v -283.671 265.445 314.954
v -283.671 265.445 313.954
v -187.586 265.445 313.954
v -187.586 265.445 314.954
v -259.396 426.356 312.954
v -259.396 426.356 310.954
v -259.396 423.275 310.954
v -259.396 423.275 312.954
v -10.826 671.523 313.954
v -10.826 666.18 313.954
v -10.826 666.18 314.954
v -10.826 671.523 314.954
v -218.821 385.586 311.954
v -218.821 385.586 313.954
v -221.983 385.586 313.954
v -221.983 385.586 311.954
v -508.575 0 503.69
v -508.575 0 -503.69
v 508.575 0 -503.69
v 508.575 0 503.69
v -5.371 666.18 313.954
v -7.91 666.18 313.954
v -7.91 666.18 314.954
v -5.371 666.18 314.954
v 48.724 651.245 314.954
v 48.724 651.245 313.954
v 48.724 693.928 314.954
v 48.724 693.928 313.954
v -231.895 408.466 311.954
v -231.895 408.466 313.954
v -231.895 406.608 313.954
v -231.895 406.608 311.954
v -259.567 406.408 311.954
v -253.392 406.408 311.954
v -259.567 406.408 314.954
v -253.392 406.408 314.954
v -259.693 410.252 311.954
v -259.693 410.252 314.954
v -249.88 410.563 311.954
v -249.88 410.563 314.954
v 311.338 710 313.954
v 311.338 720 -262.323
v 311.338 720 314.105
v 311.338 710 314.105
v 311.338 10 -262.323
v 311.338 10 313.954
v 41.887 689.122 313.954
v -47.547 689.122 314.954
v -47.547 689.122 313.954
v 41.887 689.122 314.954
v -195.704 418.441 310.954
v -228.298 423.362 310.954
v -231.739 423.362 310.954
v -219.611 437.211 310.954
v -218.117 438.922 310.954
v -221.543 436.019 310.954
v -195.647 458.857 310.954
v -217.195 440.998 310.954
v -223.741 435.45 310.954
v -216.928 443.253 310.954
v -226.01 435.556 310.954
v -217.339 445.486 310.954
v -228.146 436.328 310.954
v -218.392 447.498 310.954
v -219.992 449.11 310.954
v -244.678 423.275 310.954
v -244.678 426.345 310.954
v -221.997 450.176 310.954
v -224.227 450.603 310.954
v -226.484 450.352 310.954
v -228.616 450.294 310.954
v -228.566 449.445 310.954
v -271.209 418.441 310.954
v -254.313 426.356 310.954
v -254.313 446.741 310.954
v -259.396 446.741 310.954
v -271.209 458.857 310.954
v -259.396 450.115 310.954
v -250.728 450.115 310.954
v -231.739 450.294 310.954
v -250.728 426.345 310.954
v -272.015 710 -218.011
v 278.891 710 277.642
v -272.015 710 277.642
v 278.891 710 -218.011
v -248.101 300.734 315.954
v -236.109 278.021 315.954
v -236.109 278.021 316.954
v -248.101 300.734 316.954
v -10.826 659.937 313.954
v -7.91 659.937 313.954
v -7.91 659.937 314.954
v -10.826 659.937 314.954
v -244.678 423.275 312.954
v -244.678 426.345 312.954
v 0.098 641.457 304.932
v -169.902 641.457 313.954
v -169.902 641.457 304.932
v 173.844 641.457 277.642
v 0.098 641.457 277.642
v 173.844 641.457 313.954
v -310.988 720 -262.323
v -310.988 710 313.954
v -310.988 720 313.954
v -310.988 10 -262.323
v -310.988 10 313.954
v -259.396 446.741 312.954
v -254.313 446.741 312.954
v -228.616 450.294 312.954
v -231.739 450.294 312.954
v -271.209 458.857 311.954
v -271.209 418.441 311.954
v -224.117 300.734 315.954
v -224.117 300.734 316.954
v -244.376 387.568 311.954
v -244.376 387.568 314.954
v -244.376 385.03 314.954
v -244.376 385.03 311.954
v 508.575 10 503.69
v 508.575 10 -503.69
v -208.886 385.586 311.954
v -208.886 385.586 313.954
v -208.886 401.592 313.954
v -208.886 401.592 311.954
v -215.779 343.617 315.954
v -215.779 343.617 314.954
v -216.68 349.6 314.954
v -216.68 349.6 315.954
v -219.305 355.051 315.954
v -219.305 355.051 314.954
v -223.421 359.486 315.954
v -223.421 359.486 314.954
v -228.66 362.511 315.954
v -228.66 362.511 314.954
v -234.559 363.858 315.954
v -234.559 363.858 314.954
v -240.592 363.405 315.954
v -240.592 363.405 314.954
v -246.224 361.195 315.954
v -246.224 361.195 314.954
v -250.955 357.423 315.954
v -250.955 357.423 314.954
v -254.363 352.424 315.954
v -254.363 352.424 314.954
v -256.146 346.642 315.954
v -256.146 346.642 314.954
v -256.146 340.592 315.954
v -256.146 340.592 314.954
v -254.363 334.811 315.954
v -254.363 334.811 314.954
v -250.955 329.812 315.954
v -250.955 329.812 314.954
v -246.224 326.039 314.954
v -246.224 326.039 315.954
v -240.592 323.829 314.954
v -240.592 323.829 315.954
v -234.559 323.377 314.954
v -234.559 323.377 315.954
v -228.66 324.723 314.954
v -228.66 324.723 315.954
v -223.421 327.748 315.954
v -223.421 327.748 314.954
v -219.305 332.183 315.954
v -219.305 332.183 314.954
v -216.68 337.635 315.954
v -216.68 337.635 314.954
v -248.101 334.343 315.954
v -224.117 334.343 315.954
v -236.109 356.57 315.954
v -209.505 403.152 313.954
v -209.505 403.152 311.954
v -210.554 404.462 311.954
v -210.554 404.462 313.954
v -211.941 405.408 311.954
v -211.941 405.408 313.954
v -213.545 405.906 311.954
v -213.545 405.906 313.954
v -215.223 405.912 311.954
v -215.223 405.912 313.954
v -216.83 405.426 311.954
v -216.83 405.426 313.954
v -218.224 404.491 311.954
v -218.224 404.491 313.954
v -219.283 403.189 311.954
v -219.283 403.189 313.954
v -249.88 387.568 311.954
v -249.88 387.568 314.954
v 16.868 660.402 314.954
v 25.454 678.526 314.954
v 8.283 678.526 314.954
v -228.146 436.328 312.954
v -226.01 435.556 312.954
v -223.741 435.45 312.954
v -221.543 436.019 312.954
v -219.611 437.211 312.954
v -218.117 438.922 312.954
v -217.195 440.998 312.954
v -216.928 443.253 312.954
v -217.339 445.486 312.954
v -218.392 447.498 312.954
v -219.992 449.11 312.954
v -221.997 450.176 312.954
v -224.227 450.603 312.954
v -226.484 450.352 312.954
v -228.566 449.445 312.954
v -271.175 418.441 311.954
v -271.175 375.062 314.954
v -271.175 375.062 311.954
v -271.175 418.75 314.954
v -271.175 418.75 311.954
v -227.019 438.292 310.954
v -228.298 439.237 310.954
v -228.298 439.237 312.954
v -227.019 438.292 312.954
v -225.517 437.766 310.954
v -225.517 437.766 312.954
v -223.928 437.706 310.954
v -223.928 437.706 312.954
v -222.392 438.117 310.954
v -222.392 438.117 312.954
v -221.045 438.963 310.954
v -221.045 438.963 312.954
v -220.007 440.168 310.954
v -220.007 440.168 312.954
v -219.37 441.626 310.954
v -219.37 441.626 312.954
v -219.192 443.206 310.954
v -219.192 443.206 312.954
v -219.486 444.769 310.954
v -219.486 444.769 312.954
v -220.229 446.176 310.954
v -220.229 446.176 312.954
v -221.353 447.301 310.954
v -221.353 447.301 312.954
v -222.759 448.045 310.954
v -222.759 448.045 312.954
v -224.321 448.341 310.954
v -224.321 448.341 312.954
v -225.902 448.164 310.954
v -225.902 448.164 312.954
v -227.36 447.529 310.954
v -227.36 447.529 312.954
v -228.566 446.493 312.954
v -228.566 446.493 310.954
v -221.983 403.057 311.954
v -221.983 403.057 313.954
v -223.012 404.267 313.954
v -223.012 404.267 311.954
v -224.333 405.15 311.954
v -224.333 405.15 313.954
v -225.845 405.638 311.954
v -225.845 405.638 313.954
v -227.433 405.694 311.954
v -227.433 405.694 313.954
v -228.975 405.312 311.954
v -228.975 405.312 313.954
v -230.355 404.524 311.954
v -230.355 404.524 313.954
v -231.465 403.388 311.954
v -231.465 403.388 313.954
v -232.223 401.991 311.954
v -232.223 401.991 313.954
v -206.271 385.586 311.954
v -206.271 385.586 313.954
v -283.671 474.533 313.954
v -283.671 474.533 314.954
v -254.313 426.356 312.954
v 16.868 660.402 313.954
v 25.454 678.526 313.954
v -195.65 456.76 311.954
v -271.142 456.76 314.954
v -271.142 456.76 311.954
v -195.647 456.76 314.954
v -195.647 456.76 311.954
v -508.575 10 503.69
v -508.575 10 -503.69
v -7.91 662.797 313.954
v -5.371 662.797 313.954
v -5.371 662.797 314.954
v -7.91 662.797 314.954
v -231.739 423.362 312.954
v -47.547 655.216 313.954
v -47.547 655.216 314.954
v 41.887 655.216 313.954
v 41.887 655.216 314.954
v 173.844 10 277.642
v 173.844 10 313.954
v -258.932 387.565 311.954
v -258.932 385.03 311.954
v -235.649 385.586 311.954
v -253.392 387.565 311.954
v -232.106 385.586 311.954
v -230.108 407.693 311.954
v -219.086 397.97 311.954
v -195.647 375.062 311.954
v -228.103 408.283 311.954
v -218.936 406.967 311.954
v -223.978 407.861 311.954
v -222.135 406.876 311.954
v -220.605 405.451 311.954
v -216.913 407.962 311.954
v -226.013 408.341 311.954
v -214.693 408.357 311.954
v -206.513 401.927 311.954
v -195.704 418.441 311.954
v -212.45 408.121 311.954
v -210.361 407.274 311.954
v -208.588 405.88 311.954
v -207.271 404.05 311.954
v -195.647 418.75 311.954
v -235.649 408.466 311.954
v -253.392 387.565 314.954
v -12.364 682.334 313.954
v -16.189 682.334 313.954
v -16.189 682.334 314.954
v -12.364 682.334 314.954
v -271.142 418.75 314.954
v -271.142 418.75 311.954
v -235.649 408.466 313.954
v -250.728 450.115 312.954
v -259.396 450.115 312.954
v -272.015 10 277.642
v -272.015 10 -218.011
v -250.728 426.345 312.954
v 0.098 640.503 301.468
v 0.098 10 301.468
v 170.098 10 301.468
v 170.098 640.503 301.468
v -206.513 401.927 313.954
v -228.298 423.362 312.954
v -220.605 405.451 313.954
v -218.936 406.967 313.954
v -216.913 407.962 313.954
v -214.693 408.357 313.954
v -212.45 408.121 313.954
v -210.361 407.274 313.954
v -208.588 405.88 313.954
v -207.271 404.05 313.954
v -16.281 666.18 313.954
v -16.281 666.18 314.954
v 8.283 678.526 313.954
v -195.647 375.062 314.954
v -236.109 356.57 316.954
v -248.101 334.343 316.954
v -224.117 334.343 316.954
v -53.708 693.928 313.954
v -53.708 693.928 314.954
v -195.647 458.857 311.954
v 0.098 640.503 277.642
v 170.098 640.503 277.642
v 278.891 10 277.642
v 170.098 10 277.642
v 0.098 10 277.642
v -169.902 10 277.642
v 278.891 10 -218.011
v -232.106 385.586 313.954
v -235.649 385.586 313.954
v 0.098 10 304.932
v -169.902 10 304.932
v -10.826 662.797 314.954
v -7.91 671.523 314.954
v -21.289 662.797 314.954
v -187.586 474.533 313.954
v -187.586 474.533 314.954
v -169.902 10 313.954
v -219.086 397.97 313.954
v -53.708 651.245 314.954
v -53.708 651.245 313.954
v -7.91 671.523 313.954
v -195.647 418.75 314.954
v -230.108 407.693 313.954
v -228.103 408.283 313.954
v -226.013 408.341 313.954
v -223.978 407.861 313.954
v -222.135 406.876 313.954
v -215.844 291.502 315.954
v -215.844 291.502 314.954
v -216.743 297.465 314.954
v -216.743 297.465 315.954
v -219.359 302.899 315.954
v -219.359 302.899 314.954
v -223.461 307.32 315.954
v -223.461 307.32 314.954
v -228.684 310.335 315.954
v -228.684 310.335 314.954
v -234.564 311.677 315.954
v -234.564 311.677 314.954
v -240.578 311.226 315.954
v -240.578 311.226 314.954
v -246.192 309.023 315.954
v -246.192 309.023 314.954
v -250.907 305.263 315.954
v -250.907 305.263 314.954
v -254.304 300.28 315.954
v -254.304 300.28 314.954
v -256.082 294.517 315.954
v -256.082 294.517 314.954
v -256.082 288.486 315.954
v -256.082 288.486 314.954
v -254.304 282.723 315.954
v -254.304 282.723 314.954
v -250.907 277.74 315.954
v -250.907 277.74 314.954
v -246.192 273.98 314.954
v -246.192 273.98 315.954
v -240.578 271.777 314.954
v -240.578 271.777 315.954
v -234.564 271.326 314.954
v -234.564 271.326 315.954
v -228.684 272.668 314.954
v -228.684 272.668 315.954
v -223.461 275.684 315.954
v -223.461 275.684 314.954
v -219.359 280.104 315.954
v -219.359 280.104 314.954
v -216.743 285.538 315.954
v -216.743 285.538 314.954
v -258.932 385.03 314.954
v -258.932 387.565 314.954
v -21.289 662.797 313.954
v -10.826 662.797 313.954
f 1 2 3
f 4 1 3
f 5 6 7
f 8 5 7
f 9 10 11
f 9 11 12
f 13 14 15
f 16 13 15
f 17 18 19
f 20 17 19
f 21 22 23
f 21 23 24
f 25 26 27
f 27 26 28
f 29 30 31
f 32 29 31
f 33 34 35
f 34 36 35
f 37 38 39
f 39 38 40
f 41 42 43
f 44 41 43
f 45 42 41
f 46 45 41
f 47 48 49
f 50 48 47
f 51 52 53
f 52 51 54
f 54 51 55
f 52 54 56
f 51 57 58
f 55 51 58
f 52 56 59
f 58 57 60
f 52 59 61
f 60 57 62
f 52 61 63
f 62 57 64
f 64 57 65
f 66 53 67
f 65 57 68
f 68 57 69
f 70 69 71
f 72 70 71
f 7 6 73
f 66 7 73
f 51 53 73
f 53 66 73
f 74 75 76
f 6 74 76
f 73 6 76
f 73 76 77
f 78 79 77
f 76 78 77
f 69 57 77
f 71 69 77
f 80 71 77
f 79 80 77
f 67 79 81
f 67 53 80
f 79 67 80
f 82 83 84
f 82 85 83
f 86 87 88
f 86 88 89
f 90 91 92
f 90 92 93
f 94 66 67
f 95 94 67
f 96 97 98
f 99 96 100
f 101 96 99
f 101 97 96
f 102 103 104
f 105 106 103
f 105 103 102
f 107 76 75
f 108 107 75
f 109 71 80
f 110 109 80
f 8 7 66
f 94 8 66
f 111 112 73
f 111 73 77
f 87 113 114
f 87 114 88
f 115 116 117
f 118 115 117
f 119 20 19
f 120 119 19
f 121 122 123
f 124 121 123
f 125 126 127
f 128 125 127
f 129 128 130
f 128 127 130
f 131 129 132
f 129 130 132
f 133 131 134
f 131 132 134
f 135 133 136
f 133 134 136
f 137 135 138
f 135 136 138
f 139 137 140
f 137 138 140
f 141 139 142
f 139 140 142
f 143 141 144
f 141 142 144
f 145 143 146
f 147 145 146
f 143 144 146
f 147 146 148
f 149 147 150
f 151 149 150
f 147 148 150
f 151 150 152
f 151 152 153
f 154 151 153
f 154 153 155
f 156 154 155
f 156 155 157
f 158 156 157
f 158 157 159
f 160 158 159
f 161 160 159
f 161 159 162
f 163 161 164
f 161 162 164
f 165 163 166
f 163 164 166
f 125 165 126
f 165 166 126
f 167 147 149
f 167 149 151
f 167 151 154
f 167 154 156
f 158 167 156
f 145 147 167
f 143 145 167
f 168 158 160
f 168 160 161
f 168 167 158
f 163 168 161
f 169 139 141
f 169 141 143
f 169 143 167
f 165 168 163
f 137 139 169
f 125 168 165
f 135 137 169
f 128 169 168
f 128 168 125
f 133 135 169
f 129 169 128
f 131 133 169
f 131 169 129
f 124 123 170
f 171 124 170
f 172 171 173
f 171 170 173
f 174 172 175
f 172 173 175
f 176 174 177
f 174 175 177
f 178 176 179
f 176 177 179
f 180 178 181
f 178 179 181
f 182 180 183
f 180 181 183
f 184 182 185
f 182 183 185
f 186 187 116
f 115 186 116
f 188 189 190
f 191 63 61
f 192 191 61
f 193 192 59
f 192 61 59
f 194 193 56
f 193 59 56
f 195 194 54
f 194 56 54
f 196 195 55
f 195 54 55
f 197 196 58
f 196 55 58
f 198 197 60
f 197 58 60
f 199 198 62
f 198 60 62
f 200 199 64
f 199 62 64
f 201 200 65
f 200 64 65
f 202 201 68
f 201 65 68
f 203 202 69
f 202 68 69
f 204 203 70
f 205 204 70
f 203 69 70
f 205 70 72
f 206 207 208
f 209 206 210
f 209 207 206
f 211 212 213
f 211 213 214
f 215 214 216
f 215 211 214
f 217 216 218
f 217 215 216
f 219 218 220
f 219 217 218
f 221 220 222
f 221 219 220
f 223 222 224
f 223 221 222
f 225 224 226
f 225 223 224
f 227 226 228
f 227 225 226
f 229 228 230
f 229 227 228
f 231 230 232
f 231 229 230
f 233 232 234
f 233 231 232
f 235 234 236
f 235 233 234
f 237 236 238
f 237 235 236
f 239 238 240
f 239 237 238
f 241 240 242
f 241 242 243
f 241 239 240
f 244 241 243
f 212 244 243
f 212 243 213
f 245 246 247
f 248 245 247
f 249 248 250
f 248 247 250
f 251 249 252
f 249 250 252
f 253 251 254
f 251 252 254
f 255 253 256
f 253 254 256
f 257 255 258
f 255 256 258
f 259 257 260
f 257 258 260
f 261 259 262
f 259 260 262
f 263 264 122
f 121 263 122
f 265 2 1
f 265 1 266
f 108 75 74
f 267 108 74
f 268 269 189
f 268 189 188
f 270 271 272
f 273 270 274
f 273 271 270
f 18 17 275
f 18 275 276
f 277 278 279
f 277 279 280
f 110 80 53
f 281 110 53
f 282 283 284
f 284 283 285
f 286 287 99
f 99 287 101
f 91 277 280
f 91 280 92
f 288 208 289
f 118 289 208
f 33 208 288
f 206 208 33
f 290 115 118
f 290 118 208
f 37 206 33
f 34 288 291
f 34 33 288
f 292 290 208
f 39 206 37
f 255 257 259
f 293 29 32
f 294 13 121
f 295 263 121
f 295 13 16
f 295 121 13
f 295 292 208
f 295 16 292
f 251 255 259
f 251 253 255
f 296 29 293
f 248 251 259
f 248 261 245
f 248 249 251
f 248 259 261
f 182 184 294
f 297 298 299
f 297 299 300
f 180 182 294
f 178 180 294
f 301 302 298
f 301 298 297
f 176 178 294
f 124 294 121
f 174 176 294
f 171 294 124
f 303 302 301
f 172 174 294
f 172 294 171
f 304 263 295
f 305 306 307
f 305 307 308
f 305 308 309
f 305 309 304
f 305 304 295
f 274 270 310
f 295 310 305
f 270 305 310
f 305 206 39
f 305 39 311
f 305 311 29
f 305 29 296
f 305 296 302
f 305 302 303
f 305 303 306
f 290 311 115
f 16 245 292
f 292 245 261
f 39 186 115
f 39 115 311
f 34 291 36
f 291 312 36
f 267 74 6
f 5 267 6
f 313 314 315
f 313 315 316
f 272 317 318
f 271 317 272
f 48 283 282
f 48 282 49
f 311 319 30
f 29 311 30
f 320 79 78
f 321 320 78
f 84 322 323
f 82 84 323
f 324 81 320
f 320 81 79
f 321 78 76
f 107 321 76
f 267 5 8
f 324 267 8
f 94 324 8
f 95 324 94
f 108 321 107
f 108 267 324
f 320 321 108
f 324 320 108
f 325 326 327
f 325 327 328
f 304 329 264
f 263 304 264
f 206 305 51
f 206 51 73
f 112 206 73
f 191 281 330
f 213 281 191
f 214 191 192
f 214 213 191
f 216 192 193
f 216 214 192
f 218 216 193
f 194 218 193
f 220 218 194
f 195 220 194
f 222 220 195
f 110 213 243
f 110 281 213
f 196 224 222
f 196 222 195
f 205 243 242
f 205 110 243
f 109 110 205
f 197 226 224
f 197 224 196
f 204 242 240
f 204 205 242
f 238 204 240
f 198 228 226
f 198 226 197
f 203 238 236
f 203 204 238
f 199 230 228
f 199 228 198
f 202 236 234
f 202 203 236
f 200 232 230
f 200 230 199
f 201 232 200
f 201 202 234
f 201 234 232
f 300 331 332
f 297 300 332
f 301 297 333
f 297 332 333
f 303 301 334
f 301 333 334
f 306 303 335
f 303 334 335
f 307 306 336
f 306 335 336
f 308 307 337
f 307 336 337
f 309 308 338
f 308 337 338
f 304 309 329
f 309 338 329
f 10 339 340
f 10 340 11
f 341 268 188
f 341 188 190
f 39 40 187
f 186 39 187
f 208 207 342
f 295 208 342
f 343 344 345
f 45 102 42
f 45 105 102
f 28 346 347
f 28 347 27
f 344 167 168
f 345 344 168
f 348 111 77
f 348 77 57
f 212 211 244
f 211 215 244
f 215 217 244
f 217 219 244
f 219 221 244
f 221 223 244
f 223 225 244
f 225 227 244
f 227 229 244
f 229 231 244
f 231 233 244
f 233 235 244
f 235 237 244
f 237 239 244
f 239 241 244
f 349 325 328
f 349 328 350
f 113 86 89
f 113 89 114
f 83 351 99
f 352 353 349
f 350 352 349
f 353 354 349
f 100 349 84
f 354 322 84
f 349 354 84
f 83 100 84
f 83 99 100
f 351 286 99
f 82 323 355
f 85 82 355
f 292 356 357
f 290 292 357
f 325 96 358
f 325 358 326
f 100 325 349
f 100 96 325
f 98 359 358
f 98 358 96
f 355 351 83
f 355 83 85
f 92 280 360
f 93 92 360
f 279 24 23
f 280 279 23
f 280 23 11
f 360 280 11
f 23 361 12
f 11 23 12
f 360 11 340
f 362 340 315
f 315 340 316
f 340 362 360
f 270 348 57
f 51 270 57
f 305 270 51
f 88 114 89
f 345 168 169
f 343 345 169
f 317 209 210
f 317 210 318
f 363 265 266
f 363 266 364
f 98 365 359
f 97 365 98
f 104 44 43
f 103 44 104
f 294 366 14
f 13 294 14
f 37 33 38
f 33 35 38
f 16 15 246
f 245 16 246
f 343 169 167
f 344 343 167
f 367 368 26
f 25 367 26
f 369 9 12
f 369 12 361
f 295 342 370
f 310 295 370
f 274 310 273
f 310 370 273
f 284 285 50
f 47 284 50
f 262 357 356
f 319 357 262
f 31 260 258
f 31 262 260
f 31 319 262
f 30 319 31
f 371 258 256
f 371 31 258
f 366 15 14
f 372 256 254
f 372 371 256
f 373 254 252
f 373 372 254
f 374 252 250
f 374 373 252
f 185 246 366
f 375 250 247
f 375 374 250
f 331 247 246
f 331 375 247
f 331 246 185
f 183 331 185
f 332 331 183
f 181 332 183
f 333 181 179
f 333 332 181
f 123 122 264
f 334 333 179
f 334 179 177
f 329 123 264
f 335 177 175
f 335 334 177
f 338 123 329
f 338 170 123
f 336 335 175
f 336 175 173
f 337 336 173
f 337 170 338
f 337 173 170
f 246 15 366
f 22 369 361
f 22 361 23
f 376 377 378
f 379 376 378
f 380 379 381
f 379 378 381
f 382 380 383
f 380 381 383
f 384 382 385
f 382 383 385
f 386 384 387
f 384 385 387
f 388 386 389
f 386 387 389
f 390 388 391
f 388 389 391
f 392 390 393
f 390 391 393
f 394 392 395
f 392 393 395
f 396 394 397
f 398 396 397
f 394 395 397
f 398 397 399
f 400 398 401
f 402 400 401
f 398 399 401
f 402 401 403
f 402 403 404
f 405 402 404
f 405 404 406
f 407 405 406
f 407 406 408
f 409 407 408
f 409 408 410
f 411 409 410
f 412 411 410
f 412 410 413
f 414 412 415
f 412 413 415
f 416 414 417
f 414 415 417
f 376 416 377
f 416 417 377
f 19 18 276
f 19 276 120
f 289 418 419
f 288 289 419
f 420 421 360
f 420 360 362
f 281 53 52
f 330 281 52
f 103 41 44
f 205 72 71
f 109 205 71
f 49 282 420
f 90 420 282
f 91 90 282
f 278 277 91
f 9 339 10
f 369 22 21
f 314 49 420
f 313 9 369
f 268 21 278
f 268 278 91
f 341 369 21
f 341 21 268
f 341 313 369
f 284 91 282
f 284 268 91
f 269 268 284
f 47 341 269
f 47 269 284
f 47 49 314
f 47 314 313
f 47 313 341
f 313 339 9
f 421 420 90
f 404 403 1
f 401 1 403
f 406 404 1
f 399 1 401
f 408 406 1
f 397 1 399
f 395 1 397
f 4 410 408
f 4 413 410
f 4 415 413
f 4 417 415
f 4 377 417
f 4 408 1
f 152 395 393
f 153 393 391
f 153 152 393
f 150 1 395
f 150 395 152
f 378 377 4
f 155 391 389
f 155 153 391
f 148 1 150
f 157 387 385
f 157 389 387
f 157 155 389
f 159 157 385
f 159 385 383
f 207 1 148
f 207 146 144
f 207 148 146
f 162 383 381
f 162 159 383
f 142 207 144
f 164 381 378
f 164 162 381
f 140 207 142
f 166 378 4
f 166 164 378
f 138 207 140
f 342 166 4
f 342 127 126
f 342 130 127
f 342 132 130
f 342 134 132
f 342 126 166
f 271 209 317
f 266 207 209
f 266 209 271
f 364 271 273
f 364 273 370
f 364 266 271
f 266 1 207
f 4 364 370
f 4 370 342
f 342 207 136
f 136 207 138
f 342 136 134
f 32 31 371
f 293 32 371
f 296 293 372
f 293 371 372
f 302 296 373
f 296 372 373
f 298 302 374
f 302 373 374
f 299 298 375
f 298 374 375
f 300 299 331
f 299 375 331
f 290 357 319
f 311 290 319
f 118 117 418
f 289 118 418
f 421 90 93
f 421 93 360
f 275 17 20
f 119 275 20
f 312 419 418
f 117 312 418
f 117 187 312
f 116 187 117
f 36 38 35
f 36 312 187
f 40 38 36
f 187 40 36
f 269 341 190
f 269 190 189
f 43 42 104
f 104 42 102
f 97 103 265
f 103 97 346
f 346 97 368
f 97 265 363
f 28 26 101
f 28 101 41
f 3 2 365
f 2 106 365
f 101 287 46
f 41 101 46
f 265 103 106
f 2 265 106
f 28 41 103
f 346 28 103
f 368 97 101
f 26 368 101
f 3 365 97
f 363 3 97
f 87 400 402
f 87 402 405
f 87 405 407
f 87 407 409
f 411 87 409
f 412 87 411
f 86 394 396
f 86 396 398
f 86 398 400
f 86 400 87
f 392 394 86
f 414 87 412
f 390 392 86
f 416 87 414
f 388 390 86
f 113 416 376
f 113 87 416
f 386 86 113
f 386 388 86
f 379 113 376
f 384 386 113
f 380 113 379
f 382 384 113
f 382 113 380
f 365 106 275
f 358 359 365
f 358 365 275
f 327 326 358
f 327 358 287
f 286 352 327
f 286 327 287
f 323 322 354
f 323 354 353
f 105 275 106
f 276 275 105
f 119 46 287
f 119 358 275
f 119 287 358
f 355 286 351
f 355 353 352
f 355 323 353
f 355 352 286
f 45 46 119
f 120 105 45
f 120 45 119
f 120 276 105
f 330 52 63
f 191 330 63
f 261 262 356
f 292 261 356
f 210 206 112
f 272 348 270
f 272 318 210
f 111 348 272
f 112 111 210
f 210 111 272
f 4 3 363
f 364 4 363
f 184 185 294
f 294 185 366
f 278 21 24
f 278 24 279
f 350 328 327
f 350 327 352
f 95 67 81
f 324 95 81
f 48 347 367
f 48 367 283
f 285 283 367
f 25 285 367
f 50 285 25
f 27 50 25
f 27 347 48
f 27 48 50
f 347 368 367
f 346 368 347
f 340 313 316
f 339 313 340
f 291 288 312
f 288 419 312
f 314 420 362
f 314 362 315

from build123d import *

# Parameters (mm, degrees)
SKETCH1_W            = 1017.150431592
SKETCH1_H            = 1007.380411388
BOSS_EXTRUDE1_DEPTH  = 10
SKETCH2_W            = 622.325209365
SKETCH2_H            = 576.276335175
SKETCH2_W_2          = 550.905616221
SKETCH2_H_2          = 495.653174758
BOSS_EXTRUDE2_DEPTH  = 700
BOSS_EXTRUDE3_DEPTH  = 10
SKETCH4_W            = 343.745663019
SKETCH4_H            = 631.457492732
CUT_EXTRUDE1_DEPTH   = 40
SKETCH5_W            = 96.085656893
SKETCH5_H            = 209.087602639
BOSS_EXTRUDE4_DEPTH  = 1
SKETCH6_W            = 75.527574186
SKETCH6_H            = 43.688329808
CUT_EXTRUDE2_DEPTH   = 1
SKETCH7_R            = 20.29708438
SKETCH7_R_2          = 20.231985555
BOSS_EXTRUDE5_DEPTH  = 1
BOSS_EXTRUDE6_DEPTH  = 1
SKETCH9_W            = 27.290112983
SKETCH9_H            = 631.457492732
BOSS_EXTRUDE7_DEPTH  = 170
SKETCH10_W           = 23.826275683
SKETCH10_H           = 630.503372623
BOSS_EXTRUDE8_DEPTH  = 170
SKETCH11_W           = 102.432085561
SKETCH11_H           = 42.683052162
BOSS_EXTRUDE9_DEPTH  = 1
SKETCH12_W           = 89.43349782
SKETCH12_H           = 33.905937228
CUT_EXTRUDE3_DEPTH   = 1
BOSS_EXTRUDE10_DEPTH = 1
BOSS_EXTRUDE11_DEPTH = 1
BOSS_EXTRUDE12_DEPTH = 1
SKETCH16_W           = 75.527574186
SKETCH16_H           = 43.688329808
CUT_EXTRUDE4_DEPTH   = 2
CUT_EXTRUDE5_DEPTH   = 1
SKETCH18_W           = 75.494640665
SKETCH18_H           = 38.009856791
CUT_EXTRUDE6_DEPTH   = 3
BOSS_EXTRUDE14_DEPTH = 2
BOSS_EXTRUDE15_DEPTH = 2


with BuildPart() as part:
    # Sketch1 → Boss-Extrude1 (new body)
    with BuildSketch(Plane(origin=(0, 0, 0), x_dir=(1, 0, 0), z_dir=(0, 1, 0))):
        Rectangle(SKETCH1_W, SKETCH1_H)
    extrude(amount=BOSS_EXTRUDE1_DEPTH)

    # Sketch2 → Boss-Extrude2 (add)
    with BuildSketch(Plane(origin=(0, 10, 0), x_dir=(1, 0, 0), z_dir=(0, 1, 0))):
        with Locations((0.175057265, -25.815388539)):
            Rectangle(SKETCH2_W, SKETCH2_H)
        with Locations((3.438260109, -29.815460152)):
            Rectangle(SKETCH2_W_2, SKETCH2_H_2, mode=Mode.SUBTRACT)
    extrude(amount=BOSS_EXTRUDE2_DEPTH)

    # Sketch3 → Boss-Extrude3 (add)
    with BuildSketch(Plane(origin=(0, 710, 0), x_dir=(1, 0, 0), z_dir=(0, 1, 0))):
        Polygon((-310.987547417, 262.322779049), (311.337661948, 262.322779049), (311.337661948, -314.105065769), (-310.987547417, -313.953556126), align=None)
    extrude(amount=BOSS_EXTRUDE3_DEPTH)

    # Sketch4 → Cut-Extrude1 (cut)
    with BuildSketch(Plane.XY.offset(313.953556126)):
        with Locations((1.971257292, 325.728746366)):
            Rectangle(SKETCH4_W, SKETCH4_H)
    extrude(amount=-CUT_EXTRUDE1_DEPTH, mode=Mode.SUBTRACT)

    # Sketch5 → Boss-Extrude4 (add)
    with BuildSketch(Plane.XY.offset(313.953556126)):
        with Locations((-235.628465158, 369.989290471)):
            Rectangle(SKETCH5_W, SKETCH5_H)
    extrude(amount=BOSS_EXTRUDE4_DEPTH)

    # Sketch6 → Cut-Extrude2 (cut)
    with BuildSketch(Plane.XY.offset(314.953556126)):
        with Locations((-233.410831007, 396.905866965)):
            Rectangle(SKETCH6_W, SKETCH6_H)
    extrude(amount=-CUT_EXTRUDE2_DEPTH, mode=Mode.SUBTRACT)

    # Sketch7 → Boss-Extrude5 (add)
    with BuildSketch(Plane.XY.offset(314.953556126)):
        with Locations((-236.075713016, 343.617219623)):
            Circle(SKETCH7_R)
        with Locations((-236.075713016, 291.501520139)):
            Circle(SKETCH7_R_2)
    extrude(amount=BOSS_EXTRUDE5_DEPTH)

    # Sketch8 → Boss-Extrude6 (add)
    with BuildSketch(Plane.XY.offset(315.953556126)):
        Polygon((-248.100542069, 334.343180385), (-224.116847865, 334.343180385), (-236.108694967, 356.570085863), align=None)
        Polygon((-248.100542069, 300.734143469), (-224.116847865, 300.734143469), (-236.108694967, 278.021129489), align=None)
    extrude(amount=BOSS_EXTRUDE6_DEPTH)

    # Sketch9 → Boss-Extrude7 (add)
    with BuildSketch(Plane(origin=(-169.901574217, 0, 0), x_dir=(0, 0, -1), z_dir=(1, 0, 0))):
        with Locations((-291.287104022, 325.728746366)):
            Rectangle(SKETCH9_W, SKETCH9_H)
    extrude(amount=BOSS_EXTRUDE7_DEPTH)

    # Sketch10 → Boss-Extrude8 (add)
    with BuildSketch(Plane(origin=(0.098425783, 0, 0), x_dir=(0, 0, -1), z_dir=(1, 0, 0))):
        with Locations((-289.555185372, 325.251686312)):
            Rectangle(SKETCH10_W, SKETCH10_H)
    extrude(amount=BOSS_EXTRUDE8_DEPTH)

    # Sketch11 → Boss-Extrude9 (add)
    with BuildSketch(Plane.XY.offset(313.953556126)):
        with Locations((-2.491684156, 672.586316149)):
            Rectangle(SKETCH11_W, SKETCH11_H)
    extrude(amount=BOSS_EXTRUDE9_DEPTH)

    # Sketch12 → Cut-Extrude3 (cut)
    with BuildSketch(Plane.XY.offset(314.953556126)):
        with Locations((-2.82995258, 672.168915251)):
            Rectangle(SKETCH12_W, SKETCH12_H)
    extrude(amount=-CUT_EXTRUDE3_DEPTH, mode=Mode.SUBTRACT)

    # Sketch13 → Boss-Extrude10 (add)
    with BuildSketch(Plane.XY.offset(313.953556126)):
        Polygon((-16.188659158, 682.333537789), (-12.363636267, 682.333537789), (-16.280886962, 666.180161515), (-10.826136902, 666.180161515), (-10.826136902, 671.523280071), (-7.909927509, 671.523280071), (-7.909927509, 666.180161515), (-5.371386842, 666.180161515), (-5.371386842, 662.797245592), (-7.909927509, 662.797245592), (-7.909927509, 659.936990738), (-10.826136902, 659.936990738), (-10.826136902, 662.797245592), (-21.28940391, 662.797245592), align=None)
    extrude(amount=BOSS_EXTRUDE10_DEPTH)

    # Sketch14 → Boss-Extrude11 (add)
    with BuildSketch(Plane.XY.offset(313.953556126)):
        Polygon((8.28251296, 678.526064939), (25.453577984, 678.526064939), (16.868045472, 660.40217423), align=None)
    extrude(amount=BOSS_EXTRUDE11_DEPTH)

    # Sketch15 → Boss-Extrude12 (add)
    with BuildSketch(Plane.XY.offset(313.953556126)):
        Polygon((-253.392365097, 406.408287302), (-253.392365097, 387.565087067), (-258.932297981, 387.565087067), (-258.932297981, 385.030446751), (-244.376138332, 385.030446751), (-244.376138332, 387.568096861), (-249.880180429, 387.568096861), (-249.880180429, 410.563051887), (-259.692933011, 410.252172121), (-259.566620724, 406.408287302), align=None)
    extrude(amount=BOSS_EXTRUDE12_DEPTH)

    # Sketch16 → Cut-Extrude4 (cut)
    with BuildSketch(Plane.XY.offset(313.953556126)):
        with Locations((-233.410831007, 396.905866965)):
            Rectangle(SKETCH16_W, SKETCH16_H)
        Polygon((-258.932297981, 387.565087067), (-253.392365097, 387.565087067), (-253.392365097, 406.408287302), (-259.566620724, 406.408287302), (-259.692933011, 410.252172121), (-249.880180429, 410.563051887), (-249.880180429, 387.568096861), (-244.376138332, 387.568096861), (-244.376138332, 385.030446751), (-258.932297981, 385.030446751), align=None, mode=Mode.SUBTRACT)
        with BuildLine():
            Line((-235.648545177, 385.585769087), (-235.648545177, 408.465773981))
            Line((-235.648545177, 408.465773981), (-231.895053527, 408.465773981))
            Line((-231.895053527, 408.465773981), (-231.895053527, 406.607783771))
            ThreePointArc((-231.895053527, 406.607783771), (-226.013052079, 408.340663022), (-220.604725505, 405.450885314))
            ThreePointArc((-220.604725505, 405.450885314), (-212.450287881, 408.121471894), (-206.512581436, 401.927077024))
            Line((-206.512581436, 401.927077024), (-206.270978925, 385.585769087))
            Line((-206.270978925, 385.585769087), (-208.886279481, 385.585769087))
            Line((-208.886279481, 385.585769087), (-208.886279481, 401.591739947))
            ThreePointArc((-208.886279481, 401.591739947), (-213.544522639, 405.905815865), (-219.282803566, 403.188719557))
            Line((-219.282803566, 403.188719557), (-219.086260967, 397.970062451))
            Line((-219.086260967, 397.970062451), (-218.821188952, 385.585769087))
            Line((-218.821188952, 385.585769087), (-221.983422689, 385.585769087))
            Line((-221.983422689, 385.585769087), (-221.983422689, 403.056833873))
            ThreePointArc((-221.983422689, 403.056833873), (-227.433038153, 405.693579889), (-232.223072214, 401.991376226))
            Line((-232.223072214, 401.991376226), (-232.106265572, 385.585769087))
            Line((-232.106265572, 385.585769087), (-235.648545177, 385.585769087))
        make_face(mode=Mode.SUBTRACT)
    extrude(amount=-CUT_EXTRUDE4_DEPTH, mode=Mode.SUBTRACT)

    # Sketch17 → Cut-Extrude5 (cut)
    with BuildSketch(Plane.XY.offset(311.953556126)):
        Polygon((-271.209439503, 458.857228745), (-195.647043914, 458.857228745), (-195.704078741, 418.44137546), (-271.209439503, 418.44137546), align=None)
    extrude(amount=-CUT_EXTRUDE5_DEPTH, mode=Mode.SUBTRACT)

    # Sketch18 → Cut-Extrude6 (cut)
    with BuildSketch(Plane.XY.offset(314.953556126)):
        with Locations((-233.394364247, 437.754960265)):
            Rectangle(SKETCH18_W, SKETCH18_H)
    extrude(amount=-CUT_EXTRUDE6_DEPTH, mode=Mode.SUBTRACT)

    # Sketch19 → Boss-Extrude14 (add)
    with BuildSketch(Plane.XY.offset(310.953556126)):
        Polygon((-254.312852224, 446.740647117), (-254.312852224, 426.35566573), (-259.396180858, 426.35566573), (-259.396180858, 423.275008449), (-244.678284124, 423.275008449), (-244.678284124, 426.345347073), (-250.728067912, 426.345347073), (-250.728067912, 450.11543046), (-259.396180858, 450.11543046), (-259.396180858, 446.740647117), align=None)
    extrude(amount=BOSS_EXTRUDE14_DEPTH)

    # Sketch20 → Boss-Extrude15 (add)
    with BuildSketch(Plane.XY.offset(310.953556126)):
        with BuildLine():
            Line((-231.738910846, 449.836701393), (-231.738910846, 423.361516406))
            Line((-231.738910846, 423.361516406), (-228.297984767, 423.361516406))
            Line((-228.297984767, 423.361516406), (-228.145561752, 436.327846212))
            ThreePointArc((-228.145561752, 436.327846212), (-216.928259639, 443.252630869), (-228.56606882, 449.444715067))
            Line((-228.56606882, 449.444715067), (-228.61564163, 450.293665645))
            Line((-228.61564163, 450.293665645), (-231.738910846, 450.293665645))
            Line((-231.738910846, 450.293665645), (-231.738910846, 449.836701393))
        make_face()
        with BuildLine():
            Line((-228.56606882, 446.492870427), (-228.297984767, 439.236609845))
            ThreePointArc((-228.297984767, 439.236609845), (-219.191503534, 443.206133185), (-228.56606882, 446.492870427))
        make_face(mode=Mode.SUBTRACT)
    extrude(amount=BOSS_EXTRUDE15_DEPTH)


solid = part.part
